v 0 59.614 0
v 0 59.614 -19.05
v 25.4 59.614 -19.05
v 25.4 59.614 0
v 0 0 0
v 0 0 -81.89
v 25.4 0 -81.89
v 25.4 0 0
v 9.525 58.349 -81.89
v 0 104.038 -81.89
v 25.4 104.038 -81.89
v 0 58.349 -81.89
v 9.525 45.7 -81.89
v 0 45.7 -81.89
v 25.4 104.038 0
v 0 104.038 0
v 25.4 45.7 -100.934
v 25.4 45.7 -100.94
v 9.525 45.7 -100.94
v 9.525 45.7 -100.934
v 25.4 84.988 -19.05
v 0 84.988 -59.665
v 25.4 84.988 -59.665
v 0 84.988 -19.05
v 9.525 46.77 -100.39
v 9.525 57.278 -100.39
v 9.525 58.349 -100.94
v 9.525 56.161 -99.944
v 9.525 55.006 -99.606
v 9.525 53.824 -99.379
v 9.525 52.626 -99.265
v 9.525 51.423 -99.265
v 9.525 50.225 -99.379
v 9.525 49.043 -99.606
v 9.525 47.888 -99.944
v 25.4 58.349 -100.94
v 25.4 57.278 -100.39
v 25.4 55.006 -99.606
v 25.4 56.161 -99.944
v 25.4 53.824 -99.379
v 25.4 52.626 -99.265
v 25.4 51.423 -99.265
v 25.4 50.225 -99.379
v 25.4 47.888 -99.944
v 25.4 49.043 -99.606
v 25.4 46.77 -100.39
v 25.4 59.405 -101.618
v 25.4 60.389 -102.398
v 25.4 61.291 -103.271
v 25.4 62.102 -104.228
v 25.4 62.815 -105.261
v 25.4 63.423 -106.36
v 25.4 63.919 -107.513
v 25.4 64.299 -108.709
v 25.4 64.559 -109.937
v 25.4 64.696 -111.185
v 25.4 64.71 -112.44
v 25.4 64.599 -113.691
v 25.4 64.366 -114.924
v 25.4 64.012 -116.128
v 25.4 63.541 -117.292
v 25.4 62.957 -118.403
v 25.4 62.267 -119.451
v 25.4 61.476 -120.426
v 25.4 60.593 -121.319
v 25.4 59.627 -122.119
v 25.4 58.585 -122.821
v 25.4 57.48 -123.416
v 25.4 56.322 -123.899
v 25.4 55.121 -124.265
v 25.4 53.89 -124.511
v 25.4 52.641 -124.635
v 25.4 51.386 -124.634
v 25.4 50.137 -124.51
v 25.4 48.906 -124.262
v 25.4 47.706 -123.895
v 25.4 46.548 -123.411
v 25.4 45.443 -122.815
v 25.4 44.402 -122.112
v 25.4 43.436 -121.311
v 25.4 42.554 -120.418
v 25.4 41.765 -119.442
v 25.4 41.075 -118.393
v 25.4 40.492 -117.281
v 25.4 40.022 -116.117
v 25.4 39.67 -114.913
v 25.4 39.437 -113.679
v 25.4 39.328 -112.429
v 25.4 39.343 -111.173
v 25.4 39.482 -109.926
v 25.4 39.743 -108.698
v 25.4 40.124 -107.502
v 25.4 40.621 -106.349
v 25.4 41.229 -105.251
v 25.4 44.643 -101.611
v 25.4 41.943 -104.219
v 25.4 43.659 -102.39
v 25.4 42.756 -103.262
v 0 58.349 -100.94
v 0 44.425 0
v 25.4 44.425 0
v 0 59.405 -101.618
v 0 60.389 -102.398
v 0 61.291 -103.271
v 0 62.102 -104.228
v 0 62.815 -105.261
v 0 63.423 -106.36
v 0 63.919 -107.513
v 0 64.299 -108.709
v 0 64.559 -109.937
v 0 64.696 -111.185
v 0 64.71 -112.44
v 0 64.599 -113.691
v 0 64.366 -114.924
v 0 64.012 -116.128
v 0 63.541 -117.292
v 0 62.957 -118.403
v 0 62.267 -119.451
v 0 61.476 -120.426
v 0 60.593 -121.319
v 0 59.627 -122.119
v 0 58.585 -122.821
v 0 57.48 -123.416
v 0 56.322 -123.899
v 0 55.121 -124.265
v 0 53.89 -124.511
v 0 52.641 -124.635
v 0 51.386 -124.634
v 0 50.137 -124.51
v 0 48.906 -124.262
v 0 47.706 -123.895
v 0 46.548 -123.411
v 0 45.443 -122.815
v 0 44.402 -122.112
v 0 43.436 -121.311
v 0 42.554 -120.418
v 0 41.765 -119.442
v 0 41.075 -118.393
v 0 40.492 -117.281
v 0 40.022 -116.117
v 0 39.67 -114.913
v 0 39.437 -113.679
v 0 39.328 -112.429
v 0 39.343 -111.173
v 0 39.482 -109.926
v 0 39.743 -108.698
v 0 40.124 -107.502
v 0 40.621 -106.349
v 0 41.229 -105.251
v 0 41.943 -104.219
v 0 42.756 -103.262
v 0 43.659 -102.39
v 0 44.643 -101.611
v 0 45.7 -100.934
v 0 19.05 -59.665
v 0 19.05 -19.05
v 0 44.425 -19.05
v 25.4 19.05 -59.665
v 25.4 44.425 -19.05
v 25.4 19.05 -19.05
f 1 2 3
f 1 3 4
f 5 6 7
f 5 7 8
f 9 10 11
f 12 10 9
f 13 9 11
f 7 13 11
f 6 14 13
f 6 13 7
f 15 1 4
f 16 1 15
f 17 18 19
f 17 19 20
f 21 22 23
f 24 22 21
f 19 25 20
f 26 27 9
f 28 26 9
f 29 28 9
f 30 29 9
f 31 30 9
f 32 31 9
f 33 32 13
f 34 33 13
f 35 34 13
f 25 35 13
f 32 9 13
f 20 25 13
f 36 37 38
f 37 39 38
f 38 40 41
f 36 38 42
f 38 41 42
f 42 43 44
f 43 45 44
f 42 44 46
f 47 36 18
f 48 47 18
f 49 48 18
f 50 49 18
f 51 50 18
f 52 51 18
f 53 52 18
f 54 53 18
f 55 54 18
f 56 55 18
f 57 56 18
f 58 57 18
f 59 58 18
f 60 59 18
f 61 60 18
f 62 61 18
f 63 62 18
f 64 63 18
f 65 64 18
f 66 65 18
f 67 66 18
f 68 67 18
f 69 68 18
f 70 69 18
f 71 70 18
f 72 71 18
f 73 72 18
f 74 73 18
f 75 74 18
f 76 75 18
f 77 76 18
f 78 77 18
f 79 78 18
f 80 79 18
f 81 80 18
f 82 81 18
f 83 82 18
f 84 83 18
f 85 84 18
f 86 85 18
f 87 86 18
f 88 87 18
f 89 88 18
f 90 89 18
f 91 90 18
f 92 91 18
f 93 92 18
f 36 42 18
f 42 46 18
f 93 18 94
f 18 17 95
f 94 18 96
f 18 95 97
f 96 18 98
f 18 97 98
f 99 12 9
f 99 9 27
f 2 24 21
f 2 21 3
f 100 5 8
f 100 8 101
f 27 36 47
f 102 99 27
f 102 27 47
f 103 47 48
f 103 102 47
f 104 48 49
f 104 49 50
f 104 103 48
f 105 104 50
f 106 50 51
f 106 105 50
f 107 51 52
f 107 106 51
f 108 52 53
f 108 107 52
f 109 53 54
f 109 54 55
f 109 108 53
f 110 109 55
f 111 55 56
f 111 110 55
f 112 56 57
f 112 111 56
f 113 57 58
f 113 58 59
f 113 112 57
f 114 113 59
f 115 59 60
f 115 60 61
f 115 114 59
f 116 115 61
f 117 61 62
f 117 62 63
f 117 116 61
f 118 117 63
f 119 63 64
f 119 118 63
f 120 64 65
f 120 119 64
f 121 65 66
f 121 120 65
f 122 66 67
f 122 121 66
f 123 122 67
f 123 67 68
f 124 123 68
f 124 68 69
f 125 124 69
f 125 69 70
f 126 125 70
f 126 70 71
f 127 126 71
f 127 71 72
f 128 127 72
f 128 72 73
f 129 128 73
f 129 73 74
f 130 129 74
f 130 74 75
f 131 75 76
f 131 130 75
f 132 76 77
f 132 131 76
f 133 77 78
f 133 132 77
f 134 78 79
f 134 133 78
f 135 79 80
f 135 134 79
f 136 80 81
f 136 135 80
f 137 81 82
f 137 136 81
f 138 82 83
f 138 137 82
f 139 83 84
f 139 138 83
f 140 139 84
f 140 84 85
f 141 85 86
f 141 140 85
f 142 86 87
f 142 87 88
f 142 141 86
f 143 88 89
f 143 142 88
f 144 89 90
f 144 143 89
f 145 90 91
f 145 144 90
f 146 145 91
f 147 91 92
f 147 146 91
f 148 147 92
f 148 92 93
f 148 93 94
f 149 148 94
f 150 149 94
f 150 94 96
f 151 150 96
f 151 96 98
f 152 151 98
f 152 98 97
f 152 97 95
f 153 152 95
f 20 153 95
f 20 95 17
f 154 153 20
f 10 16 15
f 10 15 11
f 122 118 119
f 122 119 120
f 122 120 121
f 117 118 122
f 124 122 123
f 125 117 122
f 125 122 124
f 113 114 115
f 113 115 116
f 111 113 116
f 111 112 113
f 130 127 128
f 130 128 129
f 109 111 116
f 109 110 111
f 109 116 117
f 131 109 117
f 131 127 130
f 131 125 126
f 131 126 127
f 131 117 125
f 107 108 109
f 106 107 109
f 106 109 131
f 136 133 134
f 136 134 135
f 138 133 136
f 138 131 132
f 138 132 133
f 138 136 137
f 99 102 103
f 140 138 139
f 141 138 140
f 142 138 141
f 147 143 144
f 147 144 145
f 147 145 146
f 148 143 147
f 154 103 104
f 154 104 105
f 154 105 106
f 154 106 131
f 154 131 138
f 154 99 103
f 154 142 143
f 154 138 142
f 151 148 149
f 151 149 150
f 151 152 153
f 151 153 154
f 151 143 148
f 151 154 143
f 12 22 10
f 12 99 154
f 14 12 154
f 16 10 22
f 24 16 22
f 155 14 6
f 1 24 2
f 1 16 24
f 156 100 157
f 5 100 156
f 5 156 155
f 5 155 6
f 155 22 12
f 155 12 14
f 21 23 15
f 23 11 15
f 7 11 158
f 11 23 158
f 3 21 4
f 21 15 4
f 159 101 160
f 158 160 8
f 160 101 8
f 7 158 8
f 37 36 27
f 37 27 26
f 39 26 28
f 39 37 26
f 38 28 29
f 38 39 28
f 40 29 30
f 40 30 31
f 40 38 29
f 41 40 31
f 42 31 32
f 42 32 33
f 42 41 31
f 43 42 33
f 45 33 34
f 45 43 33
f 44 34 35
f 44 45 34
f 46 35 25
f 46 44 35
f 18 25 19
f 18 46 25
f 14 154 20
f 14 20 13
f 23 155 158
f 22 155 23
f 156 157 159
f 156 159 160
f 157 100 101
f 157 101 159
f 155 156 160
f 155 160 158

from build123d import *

# Parameters (mm, degrees)
BOSS_EXTRUDE1_DEPTH = 25.4
CUT_EXTRUDE1_DEPTH  = 15.875


with BuildPart() as part:
    # Sketch1 → Boss-Extrude1 (new body)
    with BuildSketch(Plane.YZ):
        with BuildLine():
            Line((0, 0), (44.4246, 0))
            Line((44.4246, 0), (44.4246, -19.05))
            Line((44.4246, -19.05), (19.05, -19.05))
            Line((19.05, -19.05), (19.05, -59.6646))
            Line((19.05, -59.6646), (84.9884, -59.6646))
            Line((84.9884, -59.6646), (84.9884, -19.05))
            Line((84.9884, -19.05), (59.6138, -19.05))
            Line((59.6138, -19.05), (59.6138, 0))
            Line((59.6138, 0), (104.0384, 0))
            Line((104.0384, 0), (104.0384, -81.8896))
            Line((104.0384, -81.8896), (58.34888, -81.8896))
            Line((58.34888, -81.8896), (58.34888, -100.9396))
            ThreePointArc((58.34888, -100.9396), (52.013341911, -124.649828033), (45.69968, -100.933765343))
            Line((45.69968, -100.933765343), (45.69968, -81.8896))
            Line((45.69968, -81.8896), (0, -81.8896))
            Line((0, -81.8896), (0, 0))
        make_face()
    extrude(amount=BOSS_EXTRUDE1_DEPTH)

    # Sketch2 → Cut-Extrude1 (cut)
    with BuildSketch(Plane.YZ.offset(25.4)):
        with BuildLine():
            Line((45.69968, -81.8896), (58.34888, -81.8896))
            Line((58.34888, -81.8896), (58.34888, -100.9396))
            ThreePointArc((58.34888, -100.9396), (52.02428, -99.251185541), (45.69968, -100.9396))
            Line((45.69968, -100.9396), (45.69968, -81.8896))
        make_face()
    extrude(amount=-CUT_EXTRUDE1_DEPTH, mode=Mode.SUBTRACT)


solid = part.part
